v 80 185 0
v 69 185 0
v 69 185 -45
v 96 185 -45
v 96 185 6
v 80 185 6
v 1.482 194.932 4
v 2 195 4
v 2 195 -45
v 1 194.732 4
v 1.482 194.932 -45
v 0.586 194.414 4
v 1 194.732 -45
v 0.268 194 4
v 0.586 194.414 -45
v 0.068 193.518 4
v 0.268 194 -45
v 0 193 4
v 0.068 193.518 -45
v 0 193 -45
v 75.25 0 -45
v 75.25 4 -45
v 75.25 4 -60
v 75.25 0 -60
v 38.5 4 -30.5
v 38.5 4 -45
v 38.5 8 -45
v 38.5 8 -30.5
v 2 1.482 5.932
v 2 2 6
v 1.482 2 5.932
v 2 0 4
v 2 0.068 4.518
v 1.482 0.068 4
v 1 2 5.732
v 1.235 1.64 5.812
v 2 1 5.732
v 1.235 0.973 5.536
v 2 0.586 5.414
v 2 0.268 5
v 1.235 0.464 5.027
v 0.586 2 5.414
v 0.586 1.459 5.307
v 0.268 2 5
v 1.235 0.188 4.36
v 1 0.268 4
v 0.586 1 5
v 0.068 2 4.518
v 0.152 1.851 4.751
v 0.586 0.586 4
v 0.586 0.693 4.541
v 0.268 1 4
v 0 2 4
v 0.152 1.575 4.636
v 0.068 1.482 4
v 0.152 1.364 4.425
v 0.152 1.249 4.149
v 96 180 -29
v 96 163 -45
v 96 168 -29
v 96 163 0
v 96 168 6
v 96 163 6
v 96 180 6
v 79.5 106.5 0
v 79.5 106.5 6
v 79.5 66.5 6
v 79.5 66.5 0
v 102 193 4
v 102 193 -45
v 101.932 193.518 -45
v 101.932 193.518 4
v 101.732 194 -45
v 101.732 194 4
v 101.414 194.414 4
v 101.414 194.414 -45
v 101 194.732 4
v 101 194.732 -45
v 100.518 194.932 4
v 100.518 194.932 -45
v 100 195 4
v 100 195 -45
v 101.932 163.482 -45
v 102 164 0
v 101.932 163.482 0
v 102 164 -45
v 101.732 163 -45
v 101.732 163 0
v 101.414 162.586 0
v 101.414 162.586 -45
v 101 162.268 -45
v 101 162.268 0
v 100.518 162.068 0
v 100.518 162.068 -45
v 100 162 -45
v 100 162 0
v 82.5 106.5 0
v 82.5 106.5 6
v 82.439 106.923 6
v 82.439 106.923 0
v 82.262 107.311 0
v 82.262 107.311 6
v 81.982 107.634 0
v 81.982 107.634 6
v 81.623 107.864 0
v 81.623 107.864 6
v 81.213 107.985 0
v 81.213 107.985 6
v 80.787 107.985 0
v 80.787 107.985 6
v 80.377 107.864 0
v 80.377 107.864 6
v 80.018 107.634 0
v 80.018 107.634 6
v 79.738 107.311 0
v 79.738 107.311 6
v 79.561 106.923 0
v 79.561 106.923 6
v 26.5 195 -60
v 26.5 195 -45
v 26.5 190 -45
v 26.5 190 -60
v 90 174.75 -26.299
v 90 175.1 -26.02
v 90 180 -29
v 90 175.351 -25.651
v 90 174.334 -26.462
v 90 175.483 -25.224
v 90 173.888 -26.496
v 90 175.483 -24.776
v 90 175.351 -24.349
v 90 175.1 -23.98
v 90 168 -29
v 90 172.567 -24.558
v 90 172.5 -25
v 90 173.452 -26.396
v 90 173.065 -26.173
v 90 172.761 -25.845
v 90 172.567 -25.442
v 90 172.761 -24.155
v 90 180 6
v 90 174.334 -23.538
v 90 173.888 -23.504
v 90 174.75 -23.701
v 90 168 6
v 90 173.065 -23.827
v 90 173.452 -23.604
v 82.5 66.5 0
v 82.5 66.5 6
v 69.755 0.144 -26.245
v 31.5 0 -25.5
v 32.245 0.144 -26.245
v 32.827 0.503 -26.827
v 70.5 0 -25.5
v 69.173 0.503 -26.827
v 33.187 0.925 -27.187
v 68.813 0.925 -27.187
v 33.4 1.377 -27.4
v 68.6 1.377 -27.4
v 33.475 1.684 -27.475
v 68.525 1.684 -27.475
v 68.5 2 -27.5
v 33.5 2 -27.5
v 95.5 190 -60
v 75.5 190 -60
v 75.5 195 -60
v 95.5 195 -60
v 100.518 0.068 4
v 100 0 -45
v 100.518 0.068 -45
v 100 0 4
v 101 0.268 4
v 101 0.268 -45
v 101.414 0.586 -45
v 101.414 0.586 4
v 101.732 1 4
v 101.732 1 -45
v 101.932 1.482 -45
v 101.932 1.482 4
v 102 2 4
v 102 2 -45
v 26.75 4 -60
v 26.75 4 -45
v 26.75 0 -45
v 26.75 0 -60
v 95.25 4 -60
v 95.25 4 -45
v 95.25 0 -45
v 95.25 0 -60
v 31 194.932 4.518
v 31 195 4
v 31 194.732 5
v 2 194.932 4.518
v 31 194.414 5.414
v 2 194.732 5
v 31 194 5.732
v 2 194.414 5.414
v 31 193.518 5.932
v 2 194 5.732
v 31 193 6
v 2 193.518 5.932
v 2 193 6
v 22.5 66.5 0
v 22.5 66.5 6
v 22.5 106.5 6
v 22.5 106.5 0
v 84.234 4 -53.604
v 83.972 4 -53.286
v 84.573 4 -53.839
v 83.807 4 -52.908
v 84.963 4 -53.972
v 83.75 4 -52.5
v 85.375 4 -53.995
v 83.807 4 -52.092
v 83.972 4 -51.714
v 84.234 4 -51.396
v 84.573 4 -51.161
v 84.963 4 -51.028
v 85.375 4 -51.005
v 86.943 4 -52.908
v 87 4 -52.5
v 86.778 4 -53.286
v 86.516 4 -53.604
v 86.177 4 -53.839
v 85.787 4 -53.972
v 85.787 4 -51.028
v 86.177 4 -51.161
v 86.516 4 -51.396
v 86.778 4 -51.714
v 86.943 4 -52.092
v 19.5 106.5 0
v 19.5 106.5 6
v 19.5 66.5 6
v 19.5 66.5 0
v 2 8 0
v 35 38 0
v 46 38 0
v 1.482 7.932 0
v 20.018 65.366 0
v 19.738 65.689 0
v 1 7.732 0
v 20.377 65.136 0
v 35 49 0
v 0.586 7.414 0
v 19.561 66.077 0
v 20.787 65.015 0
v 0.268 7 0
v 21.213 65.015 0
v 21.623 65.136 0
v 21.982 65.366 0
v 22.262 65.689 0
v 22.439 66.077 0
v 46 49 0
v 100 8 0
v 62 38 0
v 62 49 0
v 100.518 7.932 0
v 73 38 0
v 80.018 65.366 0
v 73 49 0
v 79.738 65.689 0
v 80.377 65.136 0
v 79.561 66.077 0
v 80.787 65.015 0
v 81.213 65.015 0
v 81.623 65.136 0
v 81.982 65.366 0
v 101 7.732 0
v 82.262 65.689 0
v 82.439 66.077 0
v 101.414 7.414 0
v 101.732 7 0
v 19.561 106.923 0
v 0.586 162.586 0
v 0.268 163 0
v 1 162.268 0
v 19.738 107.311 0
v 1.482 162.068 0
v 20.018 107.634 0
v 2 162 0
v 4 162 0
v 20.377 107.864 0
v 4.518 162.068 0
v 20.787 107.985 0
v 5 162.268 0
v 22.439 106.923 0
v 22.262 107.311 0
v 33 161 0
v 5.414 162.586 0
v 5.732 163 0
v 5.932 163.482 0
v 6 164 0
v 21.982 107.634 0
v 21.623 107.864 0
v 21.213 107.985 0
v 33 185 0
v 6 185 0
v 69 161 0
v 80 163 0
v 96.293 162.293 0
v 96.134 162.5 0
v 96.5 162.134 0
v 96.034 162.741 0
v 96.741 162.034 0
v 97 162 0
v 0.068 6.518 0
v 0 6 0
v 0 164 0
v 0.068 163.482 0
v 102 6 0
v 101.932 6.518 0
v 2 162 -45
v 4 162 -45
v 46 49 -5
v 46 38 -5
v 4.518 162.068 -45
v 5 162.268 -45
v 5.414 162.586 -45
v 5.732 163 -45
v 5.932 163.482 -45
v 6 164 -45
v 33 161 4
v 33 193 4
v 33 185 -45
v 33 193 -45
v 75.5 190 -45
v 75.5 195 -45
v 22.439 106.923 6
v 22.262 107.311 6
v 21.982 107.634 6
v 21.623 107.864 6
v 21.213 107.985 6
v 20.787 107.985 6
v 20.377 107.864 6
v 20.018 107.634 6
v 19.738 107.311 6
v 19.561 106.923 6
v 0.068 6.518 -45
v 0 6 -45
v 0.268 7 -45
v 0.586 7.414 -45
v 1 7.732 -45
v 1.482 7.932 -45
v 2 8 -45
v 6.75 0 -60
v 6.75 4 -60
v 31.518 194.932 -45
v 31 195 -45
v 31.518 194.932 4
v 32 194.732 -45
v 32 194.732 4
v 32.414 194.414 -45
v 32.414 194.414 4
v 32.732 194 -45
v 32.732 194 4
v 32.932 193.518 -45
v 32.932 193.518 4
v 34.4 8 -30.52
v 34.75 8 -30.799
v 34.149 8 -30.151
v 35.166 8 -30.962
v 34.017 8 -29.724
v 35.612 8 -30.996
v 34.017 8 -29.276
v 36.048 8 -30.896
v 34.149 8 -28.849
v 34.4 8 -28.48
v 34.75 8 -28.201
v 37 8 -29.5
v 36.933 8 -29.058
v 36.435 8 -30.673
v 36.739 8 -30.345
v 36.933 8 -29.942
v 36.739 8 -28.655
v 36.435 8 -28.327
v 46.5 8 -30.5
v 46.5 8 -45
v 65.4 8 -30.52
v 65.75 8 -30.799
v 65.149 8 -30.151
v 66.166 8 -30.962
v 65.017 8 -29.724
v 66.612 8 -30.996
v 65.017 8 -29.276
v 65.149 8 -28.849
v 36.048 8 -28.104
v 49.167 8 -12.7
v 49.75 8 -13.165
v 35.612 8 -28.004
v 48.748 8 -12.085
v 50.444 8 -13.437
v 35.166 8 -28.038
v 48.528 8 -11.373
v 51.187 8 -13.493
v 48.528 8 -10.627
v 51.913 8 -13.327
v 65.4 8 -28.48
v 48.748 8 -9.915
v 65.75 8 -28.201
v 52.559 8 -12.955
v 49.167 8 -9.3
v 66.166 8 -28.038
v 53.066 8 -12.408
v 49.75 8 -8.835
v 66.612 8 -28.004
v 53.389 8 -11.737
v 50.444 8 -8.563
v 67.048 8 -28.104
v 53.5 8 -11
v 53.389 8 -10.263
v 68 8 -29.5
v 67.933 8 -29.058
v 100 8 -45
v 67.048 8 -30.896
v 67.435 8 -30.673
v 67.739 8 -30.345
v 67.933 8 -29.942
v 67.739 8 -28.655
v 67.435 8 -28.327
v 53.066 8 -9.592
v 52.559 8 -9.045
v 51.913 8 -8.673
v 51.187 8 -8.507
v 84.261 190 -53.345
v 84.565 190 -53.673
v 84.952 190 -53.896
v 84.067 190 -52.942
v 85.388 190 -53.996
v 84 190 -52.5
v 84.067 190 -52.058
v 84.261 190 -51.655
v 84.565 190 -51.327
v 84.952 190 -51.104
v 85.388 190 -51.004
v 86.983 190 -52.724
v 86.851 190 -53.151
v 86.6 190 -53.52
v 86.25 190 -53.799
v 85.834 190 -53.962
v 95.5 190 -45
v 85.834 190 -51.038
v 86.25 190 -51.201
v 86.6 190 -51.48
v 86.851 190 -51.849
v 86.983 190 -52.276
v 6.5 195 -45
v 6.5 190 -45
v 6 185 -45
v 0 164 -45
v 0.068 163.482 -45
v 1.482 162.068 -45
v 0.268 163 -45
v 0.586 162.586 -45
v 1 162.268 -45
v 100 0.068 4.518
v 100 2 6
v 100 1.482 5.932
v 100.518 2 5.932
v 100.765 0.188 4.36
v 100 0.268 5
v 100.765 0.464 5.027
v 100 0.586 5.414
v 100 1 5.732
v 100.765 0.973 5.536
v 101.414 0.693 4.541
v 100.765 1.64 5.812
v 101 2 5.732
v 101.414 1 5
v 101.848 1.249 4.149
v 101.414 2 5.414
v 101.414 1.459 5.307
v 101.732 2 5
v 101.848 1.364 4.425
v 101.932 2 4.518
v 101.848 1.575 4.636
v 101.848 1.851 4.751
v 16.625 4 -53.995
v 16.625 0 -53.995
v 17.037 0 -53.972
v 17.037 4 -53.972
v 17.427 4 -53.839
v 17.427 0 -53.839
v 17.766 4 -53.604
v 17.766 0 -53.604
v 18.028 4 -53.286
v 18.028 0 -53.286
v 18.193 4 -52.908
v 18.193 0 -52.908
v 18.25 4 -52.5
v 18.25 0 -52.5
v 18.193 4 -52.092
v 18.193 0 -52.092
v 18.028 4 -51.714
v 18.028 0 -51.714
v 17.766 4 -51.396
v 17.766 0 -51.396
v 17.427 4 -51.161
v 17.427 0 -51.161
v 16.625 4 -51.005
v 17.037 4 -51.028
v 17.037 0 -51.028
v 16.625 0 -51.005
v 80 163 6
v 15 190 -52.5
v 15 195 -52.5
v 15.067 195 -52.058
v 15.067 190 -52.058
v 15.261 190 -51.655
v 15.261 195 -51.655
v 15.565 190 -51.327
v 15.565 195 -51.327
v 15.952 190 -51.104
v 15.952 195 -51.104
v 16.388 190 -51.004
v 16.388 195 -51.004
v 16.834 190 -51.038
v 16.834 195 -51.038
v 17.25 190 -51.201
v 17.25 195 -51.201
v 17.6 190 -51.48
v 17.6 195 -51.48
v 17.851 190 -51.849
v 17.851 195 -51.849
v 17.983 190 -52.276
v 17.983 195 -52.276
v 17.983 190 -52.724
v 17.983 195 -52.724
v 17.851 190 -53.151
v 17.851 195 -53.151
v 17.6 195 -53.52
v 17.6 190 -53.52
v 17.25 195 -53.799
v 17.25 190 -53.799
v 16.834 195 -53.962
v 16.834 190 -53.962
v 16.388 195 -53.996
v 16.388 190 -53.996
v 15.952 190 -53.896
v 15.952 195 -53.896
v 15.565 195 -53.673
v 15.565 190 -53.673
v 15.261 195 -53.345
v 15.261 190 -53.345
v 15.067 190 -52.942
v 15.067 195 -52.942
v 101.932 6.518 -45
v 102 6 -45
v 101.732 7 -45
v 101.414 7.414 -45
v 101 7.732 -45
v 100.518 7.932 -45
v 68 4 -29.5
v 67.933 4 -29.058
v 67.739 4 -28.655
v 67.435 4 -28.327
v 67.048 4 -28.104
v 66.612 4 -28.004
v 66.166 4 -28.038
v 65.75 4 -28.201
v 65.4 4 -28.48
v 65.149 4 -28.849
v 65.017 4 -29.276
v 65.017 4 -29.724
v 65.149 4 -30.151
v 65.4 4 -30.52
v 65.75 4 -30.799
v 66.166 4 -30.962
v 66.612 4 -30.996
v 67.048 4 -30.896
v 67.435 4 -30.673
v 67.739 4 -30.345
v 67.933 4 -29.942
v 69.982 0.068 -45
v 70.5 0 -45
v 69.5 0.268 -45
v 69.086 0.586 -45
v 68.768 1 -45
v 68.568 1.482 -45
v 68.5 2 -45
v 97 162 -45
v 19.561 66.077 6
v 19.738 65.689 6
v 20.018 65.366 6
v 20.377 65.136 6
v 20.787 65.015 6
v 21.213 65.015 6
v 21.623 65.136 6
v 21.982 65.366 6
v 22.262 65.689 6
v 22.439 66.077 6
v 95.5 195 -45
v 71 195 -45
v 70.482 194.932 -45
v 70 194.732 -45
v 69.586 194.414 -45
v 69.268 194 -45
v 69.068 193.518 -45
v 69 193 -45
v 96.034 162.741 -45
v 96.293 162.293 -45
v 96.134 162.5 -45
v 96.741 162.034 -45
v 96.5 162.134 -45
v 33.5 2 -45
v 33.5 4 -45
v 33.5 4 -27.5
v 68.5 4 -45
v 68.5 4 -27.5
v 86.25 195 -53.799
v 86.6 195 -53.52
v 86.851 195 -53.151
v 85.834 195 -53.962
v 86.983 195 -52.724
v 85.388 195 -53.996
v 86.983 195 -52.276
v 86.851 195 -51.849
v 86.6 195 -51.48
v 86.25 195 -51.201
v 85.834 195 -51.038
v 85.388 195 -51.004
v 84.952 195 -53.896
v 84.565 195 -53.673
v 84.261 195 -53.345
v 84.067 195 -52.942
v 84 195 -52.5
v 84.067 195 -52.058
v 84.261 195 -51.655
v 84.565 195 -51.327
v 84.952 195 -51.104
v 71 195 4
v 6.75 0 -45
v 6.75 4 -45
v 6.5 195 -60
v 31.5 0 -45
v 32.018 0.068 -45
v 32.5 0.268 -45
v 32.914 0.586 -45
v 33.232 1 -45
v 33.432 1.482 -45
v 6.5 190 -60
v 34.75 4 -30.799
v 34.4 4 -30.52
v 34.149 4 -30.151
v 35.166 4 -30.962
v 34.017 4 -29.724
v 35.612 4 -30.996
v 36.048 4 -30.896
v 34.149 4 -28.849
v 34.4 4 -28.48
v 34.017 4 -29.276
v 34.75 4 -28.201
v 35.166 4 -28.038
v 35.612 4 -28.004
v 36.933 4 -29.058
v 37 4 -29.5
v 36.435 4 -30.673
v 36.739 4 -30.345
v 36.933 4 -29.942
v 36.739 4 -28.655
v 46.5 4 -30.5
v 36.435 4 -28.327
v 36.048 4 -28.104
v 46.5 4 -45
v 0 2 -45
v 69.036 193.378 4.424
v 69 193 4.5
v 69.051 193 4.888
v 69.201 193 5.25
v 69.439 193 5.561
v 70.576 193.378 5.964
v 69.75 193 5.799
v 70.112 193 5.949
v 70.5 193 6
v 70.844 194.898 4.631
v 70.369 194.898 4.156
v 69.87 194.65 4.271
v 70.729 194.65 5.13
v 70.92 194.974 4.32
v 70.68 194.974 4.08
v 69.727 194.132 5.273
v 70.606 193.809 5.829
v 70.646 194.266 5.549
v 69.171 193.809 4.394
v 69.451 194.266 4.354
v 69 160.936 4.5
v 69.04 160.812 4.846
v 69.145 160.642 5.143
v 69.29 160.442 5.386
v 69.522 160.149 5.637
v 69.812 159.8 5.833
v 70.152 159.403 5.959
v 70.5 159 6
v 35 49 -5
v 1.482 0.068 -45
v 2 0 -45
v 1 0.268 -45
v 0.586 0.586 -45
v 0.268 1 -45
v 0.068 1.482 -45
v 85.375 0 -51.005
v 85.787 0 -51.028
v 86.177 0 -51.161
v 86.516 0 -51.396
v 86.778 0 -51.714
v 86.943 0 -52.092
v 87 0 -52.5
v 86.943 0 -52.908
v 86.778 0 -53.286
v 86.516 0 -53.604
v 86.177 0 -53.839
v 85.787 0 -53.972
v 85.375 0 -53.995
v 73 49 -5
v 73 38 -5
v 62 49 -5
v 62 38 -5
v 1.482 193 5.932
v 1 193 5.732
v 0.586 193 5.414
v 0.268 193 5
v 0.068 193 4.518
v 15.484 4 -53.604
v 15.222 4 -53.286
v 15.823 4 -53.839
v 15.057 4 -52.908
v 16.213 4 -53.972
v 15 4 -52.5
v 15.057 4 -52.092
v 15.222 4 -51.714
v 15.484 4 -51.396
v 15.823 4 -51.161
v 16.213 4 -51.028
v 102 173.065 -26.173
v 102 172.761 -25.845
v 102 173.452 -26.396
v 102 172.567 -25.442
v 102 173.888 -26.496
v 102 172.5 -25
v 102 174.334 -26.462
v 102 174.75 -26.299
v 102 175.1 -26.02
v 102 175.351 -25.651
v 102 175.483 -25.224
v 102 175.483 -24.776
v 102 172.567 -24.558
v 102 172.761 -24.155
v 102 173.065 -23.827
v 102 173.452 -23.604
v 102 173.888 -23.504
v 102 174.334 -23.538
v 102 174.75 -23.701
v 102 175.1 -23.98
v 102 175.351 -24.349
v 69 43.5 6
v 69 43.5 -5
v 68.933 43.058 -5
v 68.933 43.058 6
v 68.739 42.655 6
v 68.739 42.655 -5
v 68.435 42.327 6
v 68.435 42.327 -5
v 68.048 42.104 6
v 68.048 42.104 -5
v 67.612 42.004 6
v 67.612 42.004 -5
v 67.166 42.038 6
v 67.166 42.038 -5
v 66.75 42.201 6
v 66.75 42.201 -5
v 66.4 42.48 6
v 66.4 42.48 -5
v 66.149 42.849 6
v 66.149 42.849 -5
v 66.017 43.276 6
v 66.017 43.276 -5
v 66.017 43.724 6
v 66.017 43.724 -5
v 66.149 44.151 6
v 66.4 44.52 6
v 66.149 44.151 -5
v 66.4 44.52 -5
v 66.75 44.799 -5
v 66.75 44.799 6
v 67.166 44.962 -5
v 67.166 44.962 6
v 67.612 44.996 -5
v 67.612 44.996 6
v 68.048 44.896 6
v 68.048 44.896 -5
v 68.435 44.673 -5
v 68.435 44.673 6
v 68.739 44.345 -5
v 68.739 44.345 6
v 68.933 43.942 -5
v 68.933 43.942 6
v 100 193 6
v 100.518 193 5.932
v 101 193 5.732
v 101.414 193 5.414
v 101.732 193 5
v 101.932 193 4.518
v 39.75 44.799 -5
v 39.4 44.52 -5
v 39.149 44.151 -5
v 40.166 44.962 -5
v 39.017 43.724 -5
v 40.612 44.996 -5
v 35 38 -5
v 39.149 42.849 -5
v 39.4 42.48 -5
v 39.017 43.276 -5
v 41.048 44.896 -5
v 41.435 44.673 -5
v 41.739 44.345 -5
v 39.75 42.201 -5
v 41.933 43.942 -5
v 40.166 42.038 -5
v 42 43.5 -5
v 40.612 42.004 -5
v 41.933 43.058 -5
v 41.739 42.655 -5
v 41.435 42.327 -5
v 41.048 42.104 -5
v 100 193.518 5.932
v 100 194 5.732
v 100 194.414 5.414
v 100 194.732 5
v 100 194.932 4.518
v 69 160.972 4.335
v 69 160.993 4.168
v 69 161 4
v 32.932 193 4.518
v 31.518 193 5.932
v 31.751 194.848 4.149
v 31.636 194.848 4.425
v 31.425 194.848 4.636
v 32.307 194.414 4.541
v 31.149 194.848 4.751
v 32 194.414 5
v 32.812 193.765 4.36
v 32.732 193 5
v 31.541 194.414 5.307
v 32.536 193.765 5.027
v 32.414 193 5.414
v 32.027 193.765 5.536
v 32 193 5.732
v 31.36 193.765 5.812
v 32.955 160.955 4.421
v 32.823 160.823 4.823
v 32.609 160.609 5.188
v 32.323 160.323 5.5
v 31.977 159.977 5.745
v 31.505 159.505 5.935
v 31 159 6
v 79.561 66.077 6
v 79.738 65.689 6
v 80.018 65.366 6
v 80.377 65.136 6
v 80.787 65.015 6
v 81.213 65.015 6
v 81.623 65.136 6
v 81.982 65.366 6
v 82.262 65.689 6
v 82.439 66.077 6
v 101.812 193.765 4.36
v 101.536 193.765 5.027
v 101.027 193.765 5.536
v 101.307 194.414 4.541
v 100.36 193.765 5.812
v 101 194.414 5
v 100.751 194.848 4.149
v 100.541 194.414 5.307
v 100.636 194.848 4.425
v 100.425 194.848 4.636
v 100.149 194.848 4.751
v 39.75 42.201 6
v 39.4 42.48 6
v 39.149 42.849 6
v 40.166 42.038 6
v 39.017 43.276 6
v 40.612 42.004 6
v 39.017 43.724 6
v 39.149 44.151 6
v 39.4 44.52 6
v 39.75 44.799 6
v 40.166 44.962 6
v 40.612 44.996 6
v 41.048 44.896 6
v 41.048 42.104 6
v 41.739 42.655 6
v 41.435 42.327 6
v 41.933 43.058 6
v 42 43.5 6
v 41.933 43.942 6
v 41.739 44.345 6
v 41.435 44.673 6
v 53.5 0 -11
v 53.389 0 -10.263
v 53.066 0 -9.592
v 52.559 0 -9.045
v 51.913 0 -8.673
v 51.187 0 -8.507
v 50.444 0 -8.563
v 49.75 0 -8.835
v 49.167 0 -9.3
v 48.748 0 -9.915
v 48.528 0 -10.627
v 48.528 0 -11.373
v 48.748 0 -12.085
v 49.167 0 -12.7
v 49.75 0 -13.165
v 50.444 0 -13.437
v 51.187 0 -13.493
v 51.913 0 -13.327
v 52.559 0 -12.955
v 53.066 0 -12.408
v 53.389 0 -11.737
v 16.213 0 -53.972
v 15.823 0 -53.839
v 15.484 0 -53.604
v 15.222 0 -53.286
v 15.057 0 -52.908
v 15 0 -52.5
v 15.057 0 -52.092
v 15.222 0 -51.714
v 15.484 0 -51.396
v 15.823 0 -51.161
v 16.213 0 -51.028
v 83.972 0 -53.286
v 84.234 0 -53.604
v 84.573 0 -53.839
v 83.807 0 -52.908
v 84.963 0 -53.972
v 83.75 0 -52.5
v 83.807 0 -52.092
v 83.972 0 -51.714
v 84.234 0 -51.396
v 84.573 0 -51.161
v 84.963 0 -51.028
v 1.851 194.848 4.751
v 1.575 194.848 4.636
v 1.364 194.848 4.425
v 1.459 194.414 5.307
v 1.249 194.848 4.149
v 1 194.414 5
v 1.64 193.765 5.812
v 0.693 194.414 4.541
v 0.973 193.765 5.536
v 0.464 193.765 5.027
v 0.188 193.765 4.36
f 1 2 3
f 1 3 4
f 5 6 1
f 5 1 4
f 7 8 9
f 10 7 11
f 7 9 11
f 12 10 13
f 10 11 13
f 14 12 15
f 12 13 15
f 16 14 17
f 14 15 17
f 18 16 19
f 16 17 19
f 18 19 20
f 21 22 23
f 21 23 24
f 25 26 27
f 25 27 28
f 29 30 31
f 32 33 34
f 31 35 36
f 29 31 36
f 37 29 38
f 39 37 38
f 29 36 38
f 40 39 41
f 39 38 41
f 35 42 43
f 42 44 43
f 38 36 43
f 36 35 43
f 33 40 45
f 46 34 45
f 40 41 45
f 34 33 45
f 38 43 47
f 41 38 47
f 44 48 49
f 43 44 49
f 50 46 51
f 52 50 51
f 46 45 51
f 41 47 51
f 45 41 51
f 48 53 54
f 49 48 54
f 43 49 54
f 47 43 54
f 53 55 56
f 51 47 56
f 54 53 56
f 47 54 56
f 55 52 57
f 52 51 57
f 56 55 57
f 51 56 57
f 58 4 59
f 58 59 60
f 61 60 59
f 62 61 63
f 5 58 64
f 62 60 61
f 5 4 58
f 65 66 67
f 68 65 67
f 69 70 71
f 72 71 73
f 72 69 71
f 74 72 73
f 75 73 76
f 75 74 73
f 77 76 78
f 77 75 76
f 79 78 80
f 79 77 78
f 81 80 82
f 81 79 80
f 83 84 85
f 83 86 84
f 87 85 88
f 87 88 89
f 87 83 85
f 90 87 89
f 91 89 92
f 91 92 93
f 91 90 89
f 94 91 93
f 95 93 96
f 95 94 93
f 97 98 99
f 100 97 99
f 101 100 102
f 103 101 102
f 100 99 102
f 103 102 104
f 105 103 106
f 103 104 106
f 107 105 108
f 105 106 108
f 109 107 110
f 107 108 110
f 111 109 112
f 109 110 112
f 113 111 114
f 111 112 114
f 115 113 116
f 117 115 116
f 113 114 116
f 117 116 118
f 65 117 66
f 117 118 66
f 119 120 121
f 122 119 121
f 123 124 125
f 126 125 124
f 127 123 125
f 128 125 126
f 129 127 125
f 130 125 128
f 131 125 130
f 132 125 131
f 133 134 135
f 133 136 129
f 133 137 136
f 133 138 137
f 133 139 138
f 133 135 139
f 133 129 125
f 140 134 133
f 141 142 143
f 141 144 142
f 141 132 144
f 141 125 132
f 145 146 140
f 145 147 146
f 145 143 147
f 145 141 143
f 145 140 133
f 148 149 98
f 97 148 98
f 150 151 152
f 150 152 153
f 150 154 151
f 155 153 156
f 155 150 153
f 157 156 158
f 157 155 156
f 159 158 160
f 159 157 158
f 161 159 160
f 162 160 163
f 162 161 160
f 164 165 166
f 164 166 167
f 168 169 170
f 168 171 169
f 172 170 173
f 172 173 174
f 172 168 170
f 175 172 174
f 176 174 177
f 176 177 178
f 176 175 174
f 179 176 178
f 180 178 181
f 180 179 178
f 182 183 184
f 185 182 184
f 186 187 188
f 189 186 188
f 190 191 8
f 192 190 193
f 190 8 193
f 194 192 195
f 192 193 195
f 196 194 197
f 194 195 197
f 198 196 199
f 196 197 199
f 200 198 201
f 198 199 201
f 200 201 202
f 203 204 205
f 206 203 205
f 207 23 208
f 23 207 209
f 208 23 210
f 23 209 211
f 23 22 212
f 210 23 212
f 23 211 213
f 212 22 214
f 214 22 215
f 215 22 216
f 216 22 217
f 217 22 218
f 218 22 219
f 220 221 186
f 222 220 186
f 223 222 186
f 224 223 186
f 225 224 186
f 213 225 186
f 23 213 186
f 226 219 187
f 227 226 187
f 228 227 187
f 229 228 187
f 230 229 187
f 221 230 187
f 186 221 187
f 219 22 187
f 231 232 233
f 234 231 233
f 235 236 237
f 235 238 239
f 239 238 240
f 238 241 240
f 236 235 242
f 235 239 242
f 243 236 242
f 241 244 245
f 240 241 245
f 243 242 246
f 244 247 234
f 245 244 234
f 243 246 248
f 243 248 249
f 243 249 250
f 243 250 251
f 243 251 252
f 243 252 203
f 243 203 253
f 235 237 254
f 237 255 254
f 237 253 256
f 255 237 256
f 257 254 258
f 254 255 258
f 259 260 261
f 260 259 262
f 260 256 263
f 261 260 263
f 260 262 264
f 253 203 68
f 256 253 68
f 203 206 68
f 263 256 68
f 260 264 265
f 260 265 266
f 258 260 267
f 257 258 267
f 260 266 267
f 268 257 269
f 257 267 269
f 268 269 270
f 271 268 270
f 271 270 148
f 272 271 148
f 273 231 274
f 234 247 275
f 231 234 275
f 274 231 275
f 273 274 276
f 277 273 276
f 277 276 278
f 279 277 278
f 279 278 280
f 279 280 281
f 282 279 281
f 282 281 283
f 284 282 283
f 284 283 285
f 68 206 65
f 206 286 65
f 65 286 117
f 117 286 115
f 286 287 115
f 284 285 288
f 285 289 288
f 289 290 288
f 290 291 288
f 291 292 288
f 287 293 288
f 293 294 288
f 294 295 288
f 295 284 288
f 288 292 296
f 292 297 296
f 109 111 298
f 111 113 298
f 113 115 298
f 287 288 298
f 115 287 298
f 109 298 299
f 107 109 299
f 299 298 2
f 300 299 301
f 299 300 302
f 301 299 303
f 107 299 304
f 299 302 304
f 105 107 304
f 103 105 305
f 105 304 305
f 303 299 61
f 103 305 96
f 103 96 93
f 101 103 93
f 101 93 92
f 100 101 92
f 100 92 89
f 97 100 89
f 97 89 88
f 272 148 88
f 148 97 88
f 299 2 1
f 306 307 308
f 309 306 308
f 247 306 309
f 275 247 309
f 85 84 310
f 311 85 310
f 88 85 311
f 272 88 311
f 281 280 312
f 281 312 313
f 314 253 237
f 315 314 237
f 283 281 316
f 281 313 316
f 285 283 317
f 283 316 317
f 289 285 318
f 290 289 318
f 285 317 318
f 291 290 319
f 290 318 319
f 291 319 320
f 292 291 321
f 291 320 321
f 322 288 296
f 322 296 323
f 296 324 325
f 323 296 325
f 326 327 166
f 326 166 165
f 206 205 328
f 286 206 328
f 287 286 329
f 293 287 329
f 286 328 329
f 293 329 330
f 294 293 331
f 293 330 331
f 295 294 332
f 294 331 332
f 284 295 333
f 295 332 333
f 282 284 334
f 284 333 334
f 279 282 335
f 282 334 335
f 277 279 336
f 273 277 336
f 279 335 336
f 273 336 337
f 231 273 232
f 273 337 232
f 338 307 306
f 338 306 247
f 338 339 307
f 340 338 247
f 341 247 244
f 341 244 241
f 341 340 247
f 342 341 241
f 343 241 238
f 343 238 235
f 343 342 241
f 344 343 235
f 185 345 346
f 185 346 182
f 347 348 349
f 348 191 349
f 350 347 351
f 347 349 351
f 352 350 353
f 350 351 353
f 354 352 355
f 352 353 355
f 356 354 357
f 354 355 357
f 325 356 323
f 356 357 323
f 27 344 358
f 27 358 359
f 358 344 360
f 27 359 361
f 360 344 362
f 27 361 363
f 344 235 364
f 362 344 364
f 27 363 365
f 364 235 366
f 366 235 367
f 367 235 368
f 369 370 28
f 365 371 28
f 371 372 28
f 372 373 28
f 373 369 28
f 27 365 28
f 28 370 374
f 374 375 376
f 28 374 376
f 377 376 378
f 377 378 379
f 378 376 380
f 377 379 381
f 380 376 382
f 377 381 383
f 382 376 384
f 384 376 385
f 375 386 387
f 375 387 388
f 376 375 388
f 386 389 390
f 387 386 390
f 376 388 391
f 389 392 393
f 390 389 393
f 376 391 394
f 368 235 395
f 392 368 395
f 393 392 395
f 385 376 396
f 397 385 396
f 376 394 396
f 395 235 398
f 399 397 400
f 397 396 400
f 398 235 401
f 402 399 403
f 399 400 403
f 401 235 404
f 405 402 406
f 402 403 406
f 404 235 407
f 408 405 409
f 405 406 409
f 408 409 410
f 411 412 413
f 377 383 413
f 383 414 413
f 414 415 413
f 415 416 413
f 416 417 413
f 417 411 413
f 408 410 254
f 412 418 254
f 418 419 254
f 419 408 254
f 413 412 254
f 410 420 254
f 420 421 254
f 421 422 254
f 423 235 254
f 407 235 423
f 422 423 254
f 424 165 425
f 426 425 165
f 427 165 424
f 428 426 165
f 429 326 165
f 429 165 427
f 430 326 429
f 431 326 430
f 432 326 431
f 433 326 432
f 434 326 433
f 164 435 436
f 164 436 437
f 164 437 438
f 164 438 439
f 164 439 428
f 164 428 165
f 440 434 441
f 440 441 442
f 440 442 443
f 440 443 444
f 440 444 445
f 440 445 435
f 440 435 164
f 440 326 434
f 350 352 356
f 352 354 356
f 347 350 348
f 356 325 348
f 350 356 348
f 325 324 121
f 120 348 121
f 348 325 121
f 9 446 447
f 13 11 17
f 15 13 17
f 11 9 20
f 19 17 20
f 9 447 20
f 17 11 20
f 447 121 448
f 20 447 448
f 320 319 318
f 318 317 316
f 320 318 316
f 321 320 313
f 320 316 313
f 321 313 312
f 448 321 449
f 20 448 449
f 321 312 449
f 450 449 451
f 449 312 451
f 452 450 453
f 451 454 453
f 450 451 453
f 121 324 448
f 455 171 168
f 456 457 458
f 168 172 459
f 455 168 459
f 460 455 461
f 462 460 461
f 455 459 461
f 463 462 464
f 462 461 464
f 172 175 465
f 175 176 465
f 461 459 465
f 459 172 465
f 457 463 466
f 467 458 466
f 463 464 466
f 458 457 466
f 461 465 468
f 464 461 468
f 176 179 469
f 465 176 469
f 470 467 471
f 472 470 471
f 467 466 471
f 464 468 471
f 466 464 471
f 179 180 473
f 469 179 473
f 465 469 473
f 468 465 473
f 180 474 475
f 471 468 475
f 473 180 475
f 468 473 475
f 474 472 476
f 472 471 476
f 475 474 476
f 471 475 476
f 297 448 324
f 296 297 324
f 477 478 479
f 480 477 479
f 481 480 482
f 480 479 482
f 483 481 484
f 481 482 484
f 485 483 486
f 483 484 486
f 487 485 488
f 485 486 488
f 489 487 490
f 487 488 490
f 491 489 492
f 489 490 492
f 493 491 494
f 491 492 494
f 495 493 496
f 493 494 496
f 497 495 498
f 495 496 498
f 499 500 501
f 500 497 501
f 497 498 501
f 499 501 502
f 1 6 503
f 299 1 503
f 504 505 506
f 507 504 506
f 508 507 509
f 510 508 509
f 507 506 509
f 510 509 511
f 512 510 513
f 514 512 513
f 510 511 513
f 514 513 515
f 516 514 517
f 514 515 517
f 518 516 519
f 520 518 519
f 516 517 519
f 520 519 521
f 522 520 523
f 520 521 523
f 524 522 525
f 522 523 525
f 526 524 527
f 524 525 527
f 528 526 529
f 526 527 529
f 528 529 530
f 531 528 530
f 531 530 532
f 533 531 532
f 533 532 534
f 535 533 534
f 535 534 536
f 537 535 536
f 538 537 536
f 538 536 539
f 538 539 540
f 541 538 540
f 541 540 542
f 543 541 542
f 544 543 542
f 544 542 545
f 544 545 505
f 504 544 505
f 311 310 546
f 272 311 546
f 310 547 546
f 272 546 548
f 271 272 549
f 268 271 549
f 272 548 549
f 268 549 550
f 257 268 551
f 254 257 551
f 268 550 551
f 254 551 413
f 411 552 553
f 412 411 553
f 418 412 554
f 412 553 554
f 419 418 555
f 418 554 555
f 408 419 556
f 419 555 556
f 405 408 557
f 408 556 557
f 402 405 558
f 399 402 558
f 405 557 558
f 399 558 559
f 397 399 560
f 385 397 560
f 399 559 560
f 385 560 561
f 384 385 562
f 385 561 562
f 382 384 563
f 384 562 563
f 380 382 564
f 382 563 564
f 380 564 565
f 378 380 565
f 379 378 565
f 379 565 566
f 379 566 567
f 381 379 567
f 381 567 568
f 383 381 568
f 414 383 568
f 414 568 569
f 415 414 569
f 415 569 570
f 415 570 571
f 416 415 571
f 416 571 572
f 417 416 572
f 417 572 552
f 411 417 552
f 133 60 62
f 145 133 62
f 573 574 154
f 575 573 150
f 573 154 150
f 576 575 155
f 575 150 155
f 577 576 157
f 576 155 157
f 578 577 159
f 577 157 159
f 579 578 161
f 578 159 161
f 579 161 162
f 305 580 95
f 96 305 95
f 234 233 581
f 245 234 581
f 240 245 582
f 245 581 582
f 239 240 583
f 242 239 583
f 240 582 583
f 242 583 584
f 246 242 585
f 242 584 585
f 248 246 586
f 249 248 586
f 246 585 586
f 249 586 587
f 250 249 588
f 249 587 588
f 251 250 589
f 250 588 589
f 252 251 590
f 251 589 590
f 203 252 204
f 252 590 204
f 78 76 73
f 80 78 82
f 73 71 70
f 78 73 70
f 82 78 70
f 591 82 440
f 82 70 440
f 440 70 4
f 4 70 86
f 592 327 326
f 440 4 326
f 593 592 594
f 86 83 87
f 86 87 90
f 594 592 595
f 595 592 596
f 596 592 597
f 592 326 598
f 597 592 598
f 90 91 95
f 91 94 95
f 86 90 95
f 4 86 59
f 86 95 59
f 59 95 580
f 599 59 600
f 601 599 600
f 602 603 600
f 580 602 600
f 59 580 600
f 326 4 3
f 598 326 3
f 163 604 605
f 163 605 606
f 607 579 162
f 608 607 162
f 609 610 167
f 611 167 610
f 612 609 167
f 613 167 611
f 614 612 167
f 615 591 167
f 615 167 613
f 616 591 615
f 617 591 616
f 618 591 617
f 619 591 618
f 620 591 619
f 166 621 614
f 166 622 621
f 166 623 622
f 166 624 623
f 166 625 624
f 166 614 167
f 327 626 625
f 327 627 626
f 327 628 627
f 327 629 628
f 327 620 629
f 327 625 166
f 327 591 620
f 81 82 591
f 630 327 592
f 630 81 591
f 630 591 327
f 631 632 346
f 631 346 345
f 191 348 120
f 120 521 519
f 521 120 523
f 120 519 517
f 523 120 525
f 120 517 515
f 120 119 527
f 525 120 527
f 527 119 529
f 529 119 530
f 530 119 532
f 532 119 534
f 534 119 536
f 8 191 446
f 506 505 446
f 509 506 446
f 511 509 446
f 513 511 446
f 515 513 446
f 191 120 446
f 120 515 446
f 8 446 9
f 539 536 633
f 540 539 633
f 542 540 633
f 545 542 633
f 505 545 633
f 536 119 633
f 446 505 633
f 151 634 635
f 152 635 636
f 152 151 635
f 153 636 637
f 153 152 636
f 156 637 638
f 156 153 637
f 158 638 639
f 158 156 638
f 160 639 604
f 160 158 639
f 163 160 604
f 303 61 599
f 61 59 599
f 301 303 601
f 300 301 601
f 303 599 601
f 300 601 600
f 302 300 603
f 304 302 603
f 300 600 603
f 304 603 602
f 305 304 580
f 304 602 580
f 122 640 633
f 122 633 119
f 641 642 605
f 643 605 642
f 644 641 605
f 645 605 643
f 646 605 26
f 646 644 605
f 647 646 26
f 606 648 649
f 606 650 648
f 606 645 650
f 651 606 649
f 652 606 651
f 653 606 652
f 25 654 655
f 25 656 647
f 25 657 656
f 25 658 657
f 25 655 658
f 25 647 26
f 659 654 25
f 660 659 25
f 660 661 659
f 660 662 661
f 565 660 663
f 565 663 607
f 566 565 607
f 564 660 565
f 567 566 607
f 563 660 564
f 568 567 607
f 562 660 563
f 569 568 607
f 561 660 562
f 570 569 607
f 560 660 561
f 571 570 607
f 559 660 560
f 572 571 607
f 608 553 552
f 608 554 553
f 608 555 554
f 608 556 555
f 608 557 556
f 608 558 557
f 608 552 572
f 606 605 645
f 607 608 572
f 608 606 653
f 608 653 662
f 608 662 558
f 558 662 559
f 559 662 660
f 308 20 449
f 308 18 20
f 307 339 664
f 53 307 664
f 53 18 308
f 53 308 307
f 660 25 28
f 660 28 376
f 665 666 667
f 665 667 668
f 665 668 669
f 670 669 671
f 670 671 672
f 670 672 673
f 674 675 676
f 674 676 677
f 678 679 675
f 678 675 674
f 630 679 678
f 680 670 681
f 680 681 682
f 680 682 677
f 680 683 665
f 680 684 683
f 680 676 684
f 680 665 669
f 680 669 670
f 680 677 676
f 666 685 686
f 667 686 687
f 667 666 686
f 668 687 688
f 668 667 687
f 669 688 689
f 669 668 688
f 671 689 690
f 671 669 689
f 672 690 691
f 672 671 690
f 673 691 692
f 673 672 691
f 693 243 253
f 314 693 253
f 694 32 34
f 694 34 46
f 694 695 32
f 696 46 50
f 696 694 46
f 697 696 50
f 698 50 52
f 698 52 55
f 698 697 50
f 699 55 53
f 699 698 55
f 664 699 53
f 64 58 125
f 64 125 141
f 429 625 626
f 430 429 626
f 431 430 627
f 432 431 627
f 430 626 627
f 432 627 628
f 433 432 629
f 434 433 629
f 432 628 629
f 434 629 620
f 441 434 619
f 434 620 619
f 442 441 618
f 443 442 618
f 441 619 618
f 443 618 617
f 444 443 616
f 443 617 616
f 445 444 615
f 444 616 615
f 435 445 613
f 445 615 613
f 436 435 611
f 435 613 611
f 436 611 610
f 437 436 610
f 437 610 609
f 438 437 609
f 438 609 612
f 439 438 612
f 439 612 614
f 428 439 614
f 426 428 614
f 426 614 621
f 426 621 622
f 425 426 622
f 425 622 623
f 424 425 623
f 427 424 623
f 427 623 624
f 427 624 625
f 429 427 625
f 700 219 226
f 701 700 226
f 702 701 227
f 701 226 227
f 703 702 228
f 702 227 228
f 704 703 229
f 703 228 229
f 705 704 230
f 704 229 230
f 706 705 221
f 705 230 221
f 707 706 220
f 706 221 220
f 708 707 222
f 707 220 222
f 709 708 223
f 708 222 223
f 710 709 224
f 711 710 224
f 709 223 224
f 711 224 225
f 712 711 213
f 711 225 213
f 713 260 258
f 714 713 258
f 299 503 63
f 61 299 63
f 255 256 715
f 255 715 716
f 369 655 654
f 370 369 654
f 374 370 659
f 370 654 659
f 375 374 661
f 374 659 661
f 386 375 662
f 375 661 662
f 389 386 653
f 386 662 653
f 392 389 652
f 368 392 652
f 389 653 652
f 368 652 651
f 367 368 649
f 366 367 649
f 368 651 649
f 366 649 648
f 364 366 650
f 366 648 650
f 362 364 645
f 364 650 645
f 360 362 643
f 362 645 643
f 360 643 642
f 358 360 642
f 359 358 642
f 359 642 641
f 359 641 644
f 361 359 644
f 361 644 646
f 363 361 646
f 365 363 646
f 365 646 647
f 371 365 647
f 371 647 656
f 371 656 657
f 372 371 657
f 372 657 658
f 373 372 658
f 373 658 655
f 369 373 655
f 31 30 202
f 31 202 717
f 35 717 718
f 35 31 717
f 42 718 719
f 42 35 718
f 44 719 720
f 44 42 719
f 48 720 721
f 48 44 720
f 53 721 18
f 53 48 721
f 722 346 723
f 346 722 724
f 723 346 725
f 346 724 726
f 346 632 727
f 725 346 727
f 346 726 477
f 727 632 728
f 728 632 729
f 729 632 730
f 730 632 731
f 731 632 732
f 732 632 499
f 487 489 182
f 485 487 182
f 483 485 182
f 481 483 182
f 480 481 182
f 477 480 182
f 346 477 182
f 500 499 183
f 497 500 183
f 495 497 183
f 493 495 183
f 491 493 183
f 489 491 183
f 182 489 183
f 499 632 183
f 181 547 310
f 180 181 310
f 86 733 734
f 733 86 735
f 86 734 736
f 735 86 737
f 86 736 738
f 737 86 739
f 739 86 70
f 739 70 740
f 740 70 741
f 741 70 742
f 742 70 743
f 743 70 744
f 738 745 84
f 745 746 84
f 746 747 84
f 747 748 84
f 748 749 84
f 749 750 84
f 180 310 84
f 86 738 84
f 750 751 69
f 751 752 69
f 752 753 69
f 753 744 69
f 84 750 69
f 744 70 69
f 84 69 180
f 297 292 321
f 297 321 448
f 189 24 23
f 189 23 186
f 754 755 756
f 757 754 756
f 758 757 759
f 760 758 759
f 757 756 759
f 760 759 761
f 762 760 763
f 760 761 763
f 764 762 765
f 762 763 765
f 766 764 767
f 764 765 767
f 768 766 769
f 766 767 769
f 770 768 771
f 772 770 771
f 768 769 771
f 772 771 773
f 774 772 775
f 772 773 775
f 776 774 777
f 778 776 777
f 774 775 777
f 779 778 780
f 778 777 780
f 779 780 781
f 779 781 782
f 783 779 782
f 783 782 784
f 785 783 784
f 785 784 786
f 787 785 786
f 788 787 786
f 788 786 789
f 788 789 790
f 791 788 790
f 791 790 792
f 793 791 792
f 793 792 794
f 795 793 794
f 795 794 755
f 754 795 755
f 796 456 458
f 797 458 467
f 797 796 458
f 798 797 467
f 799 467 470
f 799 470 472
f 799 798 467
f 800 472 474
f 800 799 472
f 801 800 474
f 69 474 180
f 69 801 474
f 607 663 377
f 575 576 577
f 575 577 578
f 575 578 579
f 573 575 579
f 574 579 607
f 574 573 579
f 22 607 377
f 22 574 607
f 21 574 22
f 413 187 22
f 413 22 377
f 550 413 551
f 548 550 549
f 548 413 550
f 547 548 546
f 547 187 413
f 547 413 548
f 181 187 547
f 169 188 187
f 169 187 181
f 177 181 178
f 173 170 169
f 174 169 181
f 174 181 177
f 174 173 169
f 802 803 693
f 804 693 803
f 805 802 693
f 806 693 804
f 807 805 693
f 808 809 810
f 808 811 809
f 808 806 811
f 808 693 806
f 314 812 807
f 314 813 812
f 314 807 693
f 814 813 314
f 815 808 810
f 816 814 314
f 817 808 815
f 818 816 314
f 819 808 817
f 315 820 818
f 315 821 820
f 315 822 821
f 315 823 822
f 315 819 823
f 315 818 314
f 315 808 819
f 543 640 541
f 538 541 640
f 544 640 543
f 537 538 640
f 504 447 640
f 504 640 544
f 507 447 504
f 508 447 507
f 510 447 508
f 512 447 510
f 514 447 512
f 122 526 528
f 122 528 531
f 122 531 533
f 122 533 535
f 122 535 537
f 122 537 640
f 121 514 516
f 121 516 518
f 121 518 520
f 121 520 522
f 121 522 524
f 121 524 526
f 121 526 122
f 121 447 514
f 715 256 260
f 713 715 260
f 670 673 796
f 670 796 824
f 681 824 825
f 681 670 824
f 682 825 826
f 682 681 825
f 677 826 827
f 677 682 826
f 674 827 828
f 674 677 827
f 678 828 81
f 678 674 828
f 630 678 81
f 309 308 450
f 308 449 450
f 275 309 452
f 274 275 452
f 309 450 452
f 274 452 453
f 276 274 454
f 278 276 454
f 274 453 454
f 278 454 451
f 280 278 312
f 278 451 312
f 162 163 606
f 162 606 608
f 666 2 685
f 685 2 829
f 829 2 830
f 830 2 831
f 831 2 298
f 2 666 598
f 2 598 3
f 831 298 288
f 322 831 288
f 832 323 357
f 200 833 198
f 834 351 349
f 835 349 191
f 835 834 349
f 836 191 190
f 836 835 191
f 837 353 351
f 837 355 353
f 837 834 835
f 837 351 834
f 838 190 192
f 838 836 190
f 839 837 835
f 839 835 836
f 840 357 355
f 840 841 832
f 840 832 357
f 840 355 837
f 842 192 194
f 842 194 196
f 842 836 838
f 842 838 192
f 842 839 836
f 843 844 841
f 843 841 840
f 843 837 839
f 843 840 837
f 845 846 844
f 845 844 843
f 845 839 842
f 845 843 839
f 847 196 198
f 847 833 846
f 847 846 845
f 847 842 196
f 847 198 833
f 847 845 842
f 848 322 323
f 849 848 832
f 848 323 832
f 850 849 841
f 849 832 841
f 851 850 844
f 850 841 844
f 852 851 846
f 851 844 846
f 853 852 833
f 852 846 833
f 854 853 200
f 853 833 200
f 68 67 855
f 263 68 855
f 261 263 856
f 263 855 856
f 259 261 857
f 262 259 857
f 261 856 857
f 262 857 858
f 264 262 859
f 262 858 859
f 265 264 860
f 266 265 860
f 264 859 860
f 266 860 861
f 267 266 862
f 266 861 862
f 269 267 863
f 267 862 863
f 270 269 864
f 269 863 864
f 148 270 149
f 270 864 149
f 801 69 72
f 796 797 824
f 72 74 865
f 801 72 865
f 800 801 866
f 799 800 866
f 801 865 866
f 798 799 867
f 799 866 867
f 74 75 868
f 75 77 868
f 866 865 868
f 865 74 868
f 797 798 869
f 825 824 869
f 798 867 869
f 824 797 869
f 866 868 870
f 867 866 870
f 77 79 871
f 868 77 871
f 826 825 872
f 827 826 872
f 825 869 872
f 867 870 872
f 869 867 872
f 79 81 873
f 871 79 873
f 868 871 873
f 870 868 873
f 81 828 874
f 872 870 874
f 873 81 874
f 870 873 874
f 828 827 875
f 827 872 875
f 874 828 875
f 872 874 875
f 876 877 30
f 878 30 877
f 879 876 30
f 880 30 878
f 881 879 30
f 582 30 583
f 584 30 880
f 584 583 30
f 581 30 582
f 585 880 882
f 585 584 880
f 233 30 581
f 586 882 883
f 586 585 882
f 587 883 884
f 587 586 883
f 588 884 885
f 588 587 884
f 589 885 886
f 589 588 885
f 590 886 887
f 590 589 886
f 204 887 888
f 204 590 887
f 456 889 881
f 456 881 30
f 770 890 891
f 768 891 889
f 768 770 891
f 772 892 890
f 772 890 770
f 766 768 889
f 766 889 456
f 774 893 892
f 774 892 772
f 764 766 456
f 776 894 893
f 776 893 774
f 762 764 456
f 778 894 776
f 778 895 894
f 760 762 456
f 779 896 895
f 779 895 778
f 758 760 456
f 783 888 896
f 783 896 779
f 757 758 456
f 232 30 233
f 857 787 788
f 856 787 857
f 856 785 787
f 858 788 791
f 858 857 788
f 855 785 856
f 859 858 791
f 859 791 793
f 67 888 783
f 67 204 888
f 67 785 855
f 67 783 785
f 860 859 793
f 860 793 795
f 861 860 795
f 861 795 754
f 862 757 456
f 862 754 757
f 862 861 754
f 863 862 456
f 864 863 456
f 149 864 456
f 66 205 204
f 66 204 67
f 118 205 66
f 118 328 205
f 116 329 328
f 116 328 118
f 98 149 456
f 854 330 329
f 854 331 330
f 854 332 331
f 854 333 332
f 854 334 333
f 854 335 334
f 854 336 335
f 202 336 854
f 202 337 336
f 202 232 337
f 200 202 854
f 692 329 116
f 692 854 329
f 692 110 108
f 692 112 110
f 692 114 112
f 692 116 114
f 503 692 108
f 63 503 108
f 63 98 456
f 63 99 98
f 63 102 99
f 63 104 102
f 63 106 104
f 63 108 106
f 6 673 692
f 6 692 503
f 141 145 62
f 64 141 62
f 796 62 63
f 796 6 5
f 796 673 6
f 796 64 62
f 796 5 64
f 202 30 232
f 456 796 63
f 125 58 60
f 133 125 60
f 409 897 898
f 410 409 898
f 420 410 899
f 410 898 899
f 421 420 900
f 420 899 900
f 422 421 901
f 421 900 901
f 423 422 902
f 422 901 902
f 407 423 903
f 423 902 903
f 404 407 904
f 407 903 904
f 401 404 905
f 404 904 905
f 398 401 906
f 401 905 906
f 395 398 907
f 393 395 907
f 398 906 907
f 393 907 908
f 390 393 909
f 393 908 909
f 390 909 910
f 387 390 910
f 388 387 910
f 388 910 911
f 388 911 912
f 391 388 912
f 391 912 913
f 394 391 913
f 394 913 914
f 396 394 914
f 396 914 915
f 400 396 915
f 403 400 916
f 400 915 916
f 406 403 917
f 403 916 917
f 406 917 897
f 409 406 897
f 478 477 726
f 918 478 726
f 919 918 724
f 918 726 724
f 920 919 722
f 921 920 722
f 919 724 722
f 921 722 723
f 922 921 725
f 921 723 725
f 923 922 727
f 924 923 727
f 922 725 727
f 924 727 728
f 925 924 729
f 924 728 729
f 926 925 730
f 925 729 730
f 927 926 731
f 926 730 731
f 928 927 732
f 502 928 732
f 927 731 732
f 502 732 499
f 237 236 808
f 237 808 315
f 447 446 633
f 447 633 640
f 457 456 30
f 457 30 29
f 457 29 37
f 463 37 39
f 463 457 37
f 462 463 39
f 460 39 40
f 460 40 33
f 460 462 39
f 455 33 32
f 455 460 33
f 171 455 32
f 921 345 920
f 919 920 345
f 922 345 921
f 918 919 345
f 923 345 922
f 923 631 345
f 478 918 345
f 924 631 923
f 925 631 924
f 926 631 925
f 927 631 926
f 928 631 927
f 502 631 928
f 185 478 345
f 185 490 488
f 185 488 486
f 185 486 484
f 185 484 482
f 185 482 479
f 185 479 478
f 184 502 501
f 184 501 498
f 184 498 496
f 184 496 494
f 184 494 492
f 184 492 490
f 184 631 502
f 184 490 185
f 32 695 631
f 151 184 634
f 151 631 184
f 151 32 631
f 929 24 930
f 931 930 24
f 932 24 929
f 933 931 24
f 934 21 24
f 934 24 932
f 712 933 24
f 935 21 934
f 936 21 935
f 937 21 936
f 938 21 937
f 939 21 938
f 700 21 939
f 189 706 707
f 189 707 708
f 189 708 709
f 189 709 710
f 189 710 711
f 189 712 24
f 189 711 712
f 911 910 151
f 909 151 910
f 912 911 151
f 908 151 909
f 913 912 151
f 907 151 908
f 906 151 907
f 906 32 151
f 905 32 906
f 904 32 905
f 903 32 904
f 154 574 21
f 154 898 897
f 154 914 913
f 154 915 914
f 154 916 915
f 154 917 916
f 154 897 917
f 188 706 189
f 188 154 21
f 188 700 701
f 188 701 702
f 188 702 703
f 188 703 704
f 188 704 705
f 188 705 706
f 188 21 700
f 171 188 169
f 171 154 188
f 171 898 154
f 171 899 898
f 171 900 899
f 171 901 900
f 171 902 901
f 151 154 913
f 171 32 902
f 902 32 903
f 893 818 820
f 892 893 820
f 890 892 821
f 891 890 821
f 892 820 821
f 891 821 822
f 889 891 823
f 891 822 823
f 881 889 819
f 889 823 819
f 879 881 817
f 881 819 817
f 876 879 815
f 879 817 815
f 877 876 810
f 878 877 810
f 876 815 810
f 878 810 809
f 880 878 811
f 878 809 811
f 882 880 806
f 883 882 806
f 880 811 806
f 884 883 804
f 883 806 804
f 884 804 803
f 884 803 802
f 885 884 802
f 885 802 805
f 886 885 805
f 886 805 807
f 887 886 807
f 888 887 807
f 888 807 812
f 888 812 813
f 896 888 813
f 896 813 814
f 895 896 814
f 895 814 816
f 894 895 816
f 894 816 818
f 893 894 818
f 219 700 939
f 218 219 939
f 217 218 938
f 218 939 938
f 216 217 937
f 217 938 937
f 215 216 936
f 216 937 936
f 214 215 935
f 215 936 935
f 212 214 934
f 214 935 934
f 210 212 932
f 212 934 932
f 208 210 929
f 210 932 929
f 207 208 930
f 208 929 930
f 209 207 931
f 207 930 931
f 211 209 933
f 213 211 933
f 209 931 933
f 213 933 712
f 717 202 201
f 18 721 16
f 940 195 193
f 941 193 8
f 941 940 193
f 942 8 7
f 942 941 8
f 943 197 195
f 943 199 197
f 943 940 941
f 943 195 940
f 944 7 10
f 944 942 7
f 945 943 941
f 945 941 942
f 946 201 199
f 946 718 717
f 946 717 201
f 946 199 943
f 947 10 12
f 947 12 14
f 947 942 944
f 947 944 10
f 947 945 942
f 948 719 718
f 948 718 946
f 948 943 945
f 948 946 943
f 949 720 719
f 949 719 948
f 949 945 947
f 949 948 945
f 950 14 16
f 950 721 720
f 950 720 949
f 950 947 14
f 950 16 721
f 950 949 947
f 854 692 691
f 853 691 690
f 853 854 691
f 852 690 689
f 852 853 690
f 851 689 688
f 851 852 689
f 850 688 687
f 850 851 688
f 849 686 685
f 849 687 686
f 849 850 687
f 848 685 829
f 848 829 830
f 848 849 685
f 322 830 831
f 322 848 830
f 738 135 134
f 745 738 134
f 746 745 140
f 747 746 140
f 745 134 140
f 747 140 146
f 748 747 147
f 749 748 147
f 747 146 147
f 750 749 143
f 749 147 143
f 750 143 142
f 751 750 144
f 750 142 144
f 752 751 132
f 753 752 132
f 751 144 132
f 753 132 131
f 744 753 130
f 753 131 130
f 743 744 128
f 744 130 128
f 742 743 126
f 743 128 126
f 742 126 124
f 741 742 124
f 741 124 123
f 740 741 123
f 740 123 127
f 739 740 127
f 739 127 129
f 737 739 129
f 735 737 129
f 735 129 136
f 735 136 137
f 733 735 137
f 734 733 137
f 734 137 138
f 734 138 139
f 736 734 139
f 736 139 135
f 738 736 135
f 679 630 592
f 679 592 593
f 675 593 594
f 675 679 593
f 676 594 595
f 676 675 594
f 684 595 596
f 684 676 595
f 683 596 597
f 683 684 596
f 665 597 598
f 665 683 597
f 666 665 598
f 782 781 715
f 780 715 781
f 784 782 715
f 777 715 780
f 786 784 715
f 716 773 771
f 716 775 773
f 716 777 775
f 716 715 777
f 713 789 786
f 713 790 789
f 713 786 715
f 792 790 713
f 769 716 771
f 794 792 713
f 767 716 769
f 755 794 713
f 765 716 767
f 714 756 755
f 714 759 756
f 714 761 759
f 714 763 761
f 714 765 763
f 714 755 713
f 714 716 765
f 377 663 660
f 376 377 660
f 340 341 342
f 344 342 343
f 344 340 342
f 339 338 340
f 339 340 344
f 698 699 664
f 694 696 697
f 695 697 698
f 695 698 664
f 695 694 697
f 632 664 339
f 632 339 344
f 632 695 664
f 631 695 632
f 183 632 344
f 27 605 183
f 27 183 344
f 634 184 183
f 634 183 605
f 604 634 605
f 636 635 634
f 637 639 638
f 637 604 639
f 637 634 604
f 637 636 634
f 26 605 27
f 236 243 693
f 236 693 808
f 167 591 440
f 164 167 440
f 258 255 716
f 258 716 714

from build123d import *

# Parameters (mm, degrees)
PAD_DEPTH       = 6
SKETCH001_W     = 11
SKETCH001_H     = 11
PAD001_DEPTH    = 5
SKETCH003_R     = 1.5
POCKET_DEPTH    = 11.001
SKETCH004_R     = 1.5
POCKET001_DEPTH = 6
POCKET002_DEPTH = 6
SKETCH006_W     = 102
SKETCH006_H     = 8
PAD002_DEPTH    = 45
SKETCH007_W     = 35
SKETCH007_H     = 17.5
POCKET003_DEPTH = 4
SKETCH008_R     = 1.5
SKETCH008_W     = 8
SKETCH008_H     = 14.5
POCKET004_DEPTH = 5
SKETCH009_W     = 20
SKETCH009_H     = 4
PAD003_DEPTH    = 15
SKETCH010_R     = 1.5
POCKET005_DEPTH = 4
PAD004_DEPTH    = 45
SKETCH012_W     = 6
SKETCH012_H     = 6
PAD005_DEPTH    = 22
SKETCH013_W     = 20
SKETCH013_H     = 5
PAD006_DEPTH    = 15
SKETCH014_R     = 1.5
POCKET006_DEPTH = 195.001
SKETCH015_W     = 12
SKETCH015_H     = 35
PAD007_DEPTH    = 6
SKETCH016_R     = 1.5
POCKET007_DEPTH = 12.001
SKETCH018_R     = 2.5
POCKET008_DEPTH = 8
FILLET_R        = 2
FILLET001_R     = 2
FILLET002_R     = 2
FILLET003_R     = 2
FILLET004_R     = 2
FILLET005_R     = 2
FILLET006_R     = 2
FILLET007_R     = 1
FILLET008_R     = 2
FILLET009_R     = 2
FILLET010_R     = 2
FILLET011_R     = 1.5
FILLET012_R     = 2
FILLET013_R     = 2
POCKET009_DEPTH = 6


with BuildPart() as part:
    # Sketch → Pad (new body)
    with BuildSketch(Plane.XY):
        Polygon((0, 0), (102, 0), (102, 195), (69, 195), (69, 161), (33, 161), (33, 195), (0, 195), align=None)
    extrude(amount=PAD_DEPTH)

    # Sketch001 (on Face9 of Pad) → Pad001 (join)
    with BuildSketch(Plane(origin=(0, 0, 0), x_dir=(1, 0, 0), z_dir=(0, 0, -1))):
        with Locations((40.5, -43.5)):
            Rectangle(SKETCH001_W, SKETCH001_H)
        with Locations((67.5, -43.5)):
            Rectangle(SKETCH001_W, SKETCH001_H)
    extrude(amount=PAD001_DEPTH)

    # Sketch003 (on Face19 of Pad001) → Pocket (cut, through all)
    with BuildSketch(Plane(origin=(0, 0, -5), x_dir=(1, 0, 0), z_dir=(0, 0, -1))):
        with Locations((40.5, -43.5)):
            Circle(SKETCH003_R)
        with Locations((67.5, -43.5)):
            Circle(SKETCH003_R)
    extrude(amount=-POCKET_DEPTH, mode=Mode.SUBTRACT)

    # Sketch004 (on Face5 of Pocket) → Pocket001 (cut)
    with BuildSketch(Plane.XY.offset(6)):
        with Locations((21, 89.5)):
            Circle(SKETCH004_R)
        with Locations((81, 89.5)):
            Circle(SKETCH004_R)
        with Locations((81, 66.5)):
            Circle(SKETCH004_R)
        with Locations((21, 66.5)):
            Circle(SKETCH004_R)
    extrude(amount=-POCKET001_DEPTH, mode=Mode.SUBTRACT)

    # Sketch005 (on Face5 of Pocket001) → Pocket002 (cut)
    with BuildSketch(Plane.XY.offset(6)):
        Polygon((102, 185), (80, 185), (80, 163), (102, 163), (102, 168), (102, 180), align=None)
    extrude(amount=-POCKET002_DEPTH, mode=Mode.SUBTRACT)

    # Sketch006 (on Face4 of Pocket002) → Pad002 (join)
    with BuildSketch(Plane(origin=(0, 0, 0), x_dir=(1, 0, 0), z_dir=(0, 0, -1))):
        with Locations((51, -4)):
            Rectangle(SKETCH006_W, SKETCH006_H)
    extrude(amount=PAD002_DEPTH)

    # Sketch007 (on Face4 of Pad002) → Pocket003 (cut)
    with BuildSketch(Plane.XZ):
        with Locations((51, -36.25)):
            Rectangle(SKETCH007_W, SKETCH007_H)
    extrude(amount=-POCKET003_DEPTH, mode=Mode.SUBTRACT)

    # Sketch008 (on Face37 of Pocket003) → Pocket004 (cut)
    with BuildSketch(Plane.XZ.offset(-4)):
        with Locations((35.5, -29.5)):
            Circle(SKETCH008_R)
        with Locations((66.5, -29.5)):
            Circle(SKETCH008_R)
        with Locations((42.5, -37.75)):
            Rectangle(SKETCH008_W, SKETCH008_H)
    extrude(amount=-POCKET004_DEPTH, mode=Mode.SUBTRACT)

    # Sketch009 (on Face11 of Pocket004) → Pad003 (join)
    with BuildSketch(Plane(origin=(0, 0, -45), x_dir=(1, 0, 0), z_dir=(0, 0, -1))):
        with Locations((16.75, -2)):
            Rectangle(SKETCH009_W, SKETCH009_H)
        with Locations((85.25, -2)):
            Rectangle(SKETCH009_W, SKETCH009_H)
    extrude(amount=PAD003_DEPTH)

    # Sketch010 (on Face12 of Pad003) → Pocket005 (cut)
    with BuildSketch(Plane.XZ):
        with Locations((16.75, -52.5)):
            Circle(SKETCH010_R)
        with Locations((85.25, -52.5)):
            Circle(SKETCH010_R)
    extrude(amount=-POCKET005_DEPTH, mode=Mode.SUBTRACT)

    # Sketch011 (on Face7 of Pocket005) → Pad004 (join)
    with BuildSketch(Plane(origin=(0, 0, 0), x_dir=(1, 0, 0), z_dir=(0, 0, -1))):
        Polygon((96, -162), (102, -162), (102, -195), (69, -195), (69, -185), (96, -185), align=None)
        Polygon((0, -162), (6, -162), (6, -185), (33, -185), (33, -195), (0, -195), align=None)
    extrude(amount=PAD004_DEPTH)

    # Sketch012 (on Face25 of Pad004) → Pad005 (join)
    with BuildSketch(Plane.XZ.offset(-185)):
        with Locations((99, 3)):
            Rectangle(SKETCH012_W, SKETCH012_H)
    extrude(amount=PAD005_DEPTH)

    # Sketch013 (on Face37 of Pad005) → Pad006 (join)
    with BuildSketch(Plane(origin=(0, 0, -45), x_dir=(1, 0, 0), z_dir=(0, 0, -1))):
        with Locations((16.5, -192.5)):
            Rectangle(SKETCH013_W, SKETCH013_H)
        with Locations((85.5, -192.5)):
            Rectangle(SKETCH013_W, SKETCH013_H)
    extrude(amount=PAD006_DEPTH)

    # Sketch014 (on Face79 of Pad006) → Pocket006 (cut, through all)
    with BuildSketch(Plane(origin=(0, 195, 0), x_dir=(-1, 0, 0), z_dir=(0, 1, 0))):
        with Locations((-85.5, -52.5)):
            Circle(SKETCH014_R)
        with Locations((-16.5, -52.5)):
            Circle(SKETCH014_R)
    extrude(amount=-POCKET006_DEPTH, mode=Mode.SUBTRACT)

    # Sketch015 (on Face39 of Pocket006) → Pad007 (join)
    with BuildSketch(Plane(origin=(96, 0, 0), x_dir=(0, -1, 0), z_dir=(-1, 0, 0))):
        with Locations((-174, -11.5)):
            Rectangle(SKETCH015_W, SKETCH015_H)
    extrude(amount=PAD007_DEPTH)

    # Sketch016 (on Face92 of Pad007) → Pocket007 (cut, through all)
    with BuildSketch(Plane(origin=(90, 0, 0), x_dir=(0, -1, 0), z_dir=(-1, 0, 0))):
        with Locations((-174, -25)):
            Circle(SKETCH016_R)
    extrude(amount=-POCKET007_DEPTH, mode=Mode.SUBTRACT)

    # Sketch018 → Pocket008 (cut)
    with BuildSketch(Plane.XZ):
        with Locations((51, -11)):
            Circle(SKETCH018_R)
    extrude(amount=-POCKET008_DEPTH, mode=Mode.SUBTRACT)

    # Fillet
    fillet_edges = [part.edges().sort_by_distance(p)[0] for p in [
        (51, 0, 6),
    ]]
    fillet(fillet_edges, radius=FILLET_R)

    # Fillet001
    fillet001_edges = [part.edges().sort_by_distance(p)[0] for p in [
        (0, 98.5, 6),
        (102, 82.5, 6),
    ]]
    fillet(fillet001_edges, radius=FILLET001_R)

    # Fillet002
    fillet002_edges = [part.edges().sort_by_distance(p)[0] for p in [
        (102, 8, -22.5),
    ]]
    fillet(fillet002_edges, radius=FILLET002_R)

    # Fillet003
    fillet003_edges = [part.edges().sort_by_distance(p)[0] for p in [
        (0, 8, -22.5),
    ]]
    fillet(fillet003_edges, radius=FILLET003_R)

    # Fillet004
    fillet004_edges = [part.edges().sort_by_distance(p)[0] for p in [
        (33.5, 0, -36.25),
        (68.5, 0, -36.25),
    ]]
    fillet(fillet004_edges, radius=FILLET004_R)

    # Fillet005
    fillet005_edges = [part.edges().sort_by_distance(p)[0] for p in [
        (51, 0, -27.5),
    ]]
    fillet(fillet005_edges, radius=FILLET005_R)

    # Fillet006
    fillet006_edges = [part.edges().sort_by_distance(p)[0] for p in [
        (102, 162, -22.5),
    ]]
    fillet(fillet006_edges, radius=FILLET006_R)

    # Fillet007
    fillet007_edges = [part.edges().sort_by_distance(p)[0] for p in [
        (96, 162, -22.5),
    ]]
    fillet(fillet007_edges, radius=FILLET007_R)

    # Fillet008
    fillet008_edges = [part.edges().sort_by_distance(p)[0] for p in [
        (102, 195, -22.5),
        (69, 195, -22.5),
    ]]
    fillet(fillet008_edges, radius=FILLET008_R)

    # Fillet009
    fillet009_edges = [part.edges().sort_by_distance(p)[0] for p in [
        (51, 161, 6),
    ]]
    fillet(fillet009_edges, radius=FILLET009_R)

    # Fillet010
    fillet010_edges = [part.edges().sort_by_distance(p)[0] for p in [
        (33, 178, 6),
    ]]
    fillet(fillet010_edges, radius=FILLET010_R)

    # Fillet011
    fillet011_edges = [part.edges().sort_by_distance(p)[0] for p in [
        (69, 177, 6),
    ]]
    fillet(fillet011_edges, radius=FILLET011_R)

    # Fillet012
    fillet012_edges = [part.edges().sort_by_distance(p)[0] for p in [
        (33, 195, -22.5),
        (0, 195, -22.5),
    ]]
    fillet(fillet012_edges, radius=FILLET012_R)

    # Fillet013
    fillet013_edges = [part.edges().sort_by_distance(p)[0] for p in [
        (0, 162, -22.5),
        (6, 162, -22.5),
    ]]
    fillet(fillet013_edges, radius=FILLET013_R)

    # Sketch019 (on Face52 of Fillet013) → Pocket009 (cut)
    with BuildSketch(Plane.XY.offset(6)):
        with BuildLine():
            ThreePointArc((22.5, 106.5), (21, 108), (19.5, 106.5))
            Line((19.5, 106.5), (19.5, 66.5))
            ThreePointArc((19.5, 66.5), (21, 65), (22.5, 66.5))
            Line((22.5, 66.5), (22.5, 106.5))
        make_face()
        with BuildLine():
            ThreePointArc((82.5, 106.5), (81, 108), (79.5, 106.5))
            Line((79.5, 106.5), (79.5, 66.5))
            ThreePointArc((79.5, 66.5), (81, 65), (82.5, 66.5))
            Line((82.5, 66.5), (82.5, 106.5))
        make_face()
    extrude(amount=-POCKET009_DEPTH, mode=Mode.SUBTRACT)


solid = part.part
